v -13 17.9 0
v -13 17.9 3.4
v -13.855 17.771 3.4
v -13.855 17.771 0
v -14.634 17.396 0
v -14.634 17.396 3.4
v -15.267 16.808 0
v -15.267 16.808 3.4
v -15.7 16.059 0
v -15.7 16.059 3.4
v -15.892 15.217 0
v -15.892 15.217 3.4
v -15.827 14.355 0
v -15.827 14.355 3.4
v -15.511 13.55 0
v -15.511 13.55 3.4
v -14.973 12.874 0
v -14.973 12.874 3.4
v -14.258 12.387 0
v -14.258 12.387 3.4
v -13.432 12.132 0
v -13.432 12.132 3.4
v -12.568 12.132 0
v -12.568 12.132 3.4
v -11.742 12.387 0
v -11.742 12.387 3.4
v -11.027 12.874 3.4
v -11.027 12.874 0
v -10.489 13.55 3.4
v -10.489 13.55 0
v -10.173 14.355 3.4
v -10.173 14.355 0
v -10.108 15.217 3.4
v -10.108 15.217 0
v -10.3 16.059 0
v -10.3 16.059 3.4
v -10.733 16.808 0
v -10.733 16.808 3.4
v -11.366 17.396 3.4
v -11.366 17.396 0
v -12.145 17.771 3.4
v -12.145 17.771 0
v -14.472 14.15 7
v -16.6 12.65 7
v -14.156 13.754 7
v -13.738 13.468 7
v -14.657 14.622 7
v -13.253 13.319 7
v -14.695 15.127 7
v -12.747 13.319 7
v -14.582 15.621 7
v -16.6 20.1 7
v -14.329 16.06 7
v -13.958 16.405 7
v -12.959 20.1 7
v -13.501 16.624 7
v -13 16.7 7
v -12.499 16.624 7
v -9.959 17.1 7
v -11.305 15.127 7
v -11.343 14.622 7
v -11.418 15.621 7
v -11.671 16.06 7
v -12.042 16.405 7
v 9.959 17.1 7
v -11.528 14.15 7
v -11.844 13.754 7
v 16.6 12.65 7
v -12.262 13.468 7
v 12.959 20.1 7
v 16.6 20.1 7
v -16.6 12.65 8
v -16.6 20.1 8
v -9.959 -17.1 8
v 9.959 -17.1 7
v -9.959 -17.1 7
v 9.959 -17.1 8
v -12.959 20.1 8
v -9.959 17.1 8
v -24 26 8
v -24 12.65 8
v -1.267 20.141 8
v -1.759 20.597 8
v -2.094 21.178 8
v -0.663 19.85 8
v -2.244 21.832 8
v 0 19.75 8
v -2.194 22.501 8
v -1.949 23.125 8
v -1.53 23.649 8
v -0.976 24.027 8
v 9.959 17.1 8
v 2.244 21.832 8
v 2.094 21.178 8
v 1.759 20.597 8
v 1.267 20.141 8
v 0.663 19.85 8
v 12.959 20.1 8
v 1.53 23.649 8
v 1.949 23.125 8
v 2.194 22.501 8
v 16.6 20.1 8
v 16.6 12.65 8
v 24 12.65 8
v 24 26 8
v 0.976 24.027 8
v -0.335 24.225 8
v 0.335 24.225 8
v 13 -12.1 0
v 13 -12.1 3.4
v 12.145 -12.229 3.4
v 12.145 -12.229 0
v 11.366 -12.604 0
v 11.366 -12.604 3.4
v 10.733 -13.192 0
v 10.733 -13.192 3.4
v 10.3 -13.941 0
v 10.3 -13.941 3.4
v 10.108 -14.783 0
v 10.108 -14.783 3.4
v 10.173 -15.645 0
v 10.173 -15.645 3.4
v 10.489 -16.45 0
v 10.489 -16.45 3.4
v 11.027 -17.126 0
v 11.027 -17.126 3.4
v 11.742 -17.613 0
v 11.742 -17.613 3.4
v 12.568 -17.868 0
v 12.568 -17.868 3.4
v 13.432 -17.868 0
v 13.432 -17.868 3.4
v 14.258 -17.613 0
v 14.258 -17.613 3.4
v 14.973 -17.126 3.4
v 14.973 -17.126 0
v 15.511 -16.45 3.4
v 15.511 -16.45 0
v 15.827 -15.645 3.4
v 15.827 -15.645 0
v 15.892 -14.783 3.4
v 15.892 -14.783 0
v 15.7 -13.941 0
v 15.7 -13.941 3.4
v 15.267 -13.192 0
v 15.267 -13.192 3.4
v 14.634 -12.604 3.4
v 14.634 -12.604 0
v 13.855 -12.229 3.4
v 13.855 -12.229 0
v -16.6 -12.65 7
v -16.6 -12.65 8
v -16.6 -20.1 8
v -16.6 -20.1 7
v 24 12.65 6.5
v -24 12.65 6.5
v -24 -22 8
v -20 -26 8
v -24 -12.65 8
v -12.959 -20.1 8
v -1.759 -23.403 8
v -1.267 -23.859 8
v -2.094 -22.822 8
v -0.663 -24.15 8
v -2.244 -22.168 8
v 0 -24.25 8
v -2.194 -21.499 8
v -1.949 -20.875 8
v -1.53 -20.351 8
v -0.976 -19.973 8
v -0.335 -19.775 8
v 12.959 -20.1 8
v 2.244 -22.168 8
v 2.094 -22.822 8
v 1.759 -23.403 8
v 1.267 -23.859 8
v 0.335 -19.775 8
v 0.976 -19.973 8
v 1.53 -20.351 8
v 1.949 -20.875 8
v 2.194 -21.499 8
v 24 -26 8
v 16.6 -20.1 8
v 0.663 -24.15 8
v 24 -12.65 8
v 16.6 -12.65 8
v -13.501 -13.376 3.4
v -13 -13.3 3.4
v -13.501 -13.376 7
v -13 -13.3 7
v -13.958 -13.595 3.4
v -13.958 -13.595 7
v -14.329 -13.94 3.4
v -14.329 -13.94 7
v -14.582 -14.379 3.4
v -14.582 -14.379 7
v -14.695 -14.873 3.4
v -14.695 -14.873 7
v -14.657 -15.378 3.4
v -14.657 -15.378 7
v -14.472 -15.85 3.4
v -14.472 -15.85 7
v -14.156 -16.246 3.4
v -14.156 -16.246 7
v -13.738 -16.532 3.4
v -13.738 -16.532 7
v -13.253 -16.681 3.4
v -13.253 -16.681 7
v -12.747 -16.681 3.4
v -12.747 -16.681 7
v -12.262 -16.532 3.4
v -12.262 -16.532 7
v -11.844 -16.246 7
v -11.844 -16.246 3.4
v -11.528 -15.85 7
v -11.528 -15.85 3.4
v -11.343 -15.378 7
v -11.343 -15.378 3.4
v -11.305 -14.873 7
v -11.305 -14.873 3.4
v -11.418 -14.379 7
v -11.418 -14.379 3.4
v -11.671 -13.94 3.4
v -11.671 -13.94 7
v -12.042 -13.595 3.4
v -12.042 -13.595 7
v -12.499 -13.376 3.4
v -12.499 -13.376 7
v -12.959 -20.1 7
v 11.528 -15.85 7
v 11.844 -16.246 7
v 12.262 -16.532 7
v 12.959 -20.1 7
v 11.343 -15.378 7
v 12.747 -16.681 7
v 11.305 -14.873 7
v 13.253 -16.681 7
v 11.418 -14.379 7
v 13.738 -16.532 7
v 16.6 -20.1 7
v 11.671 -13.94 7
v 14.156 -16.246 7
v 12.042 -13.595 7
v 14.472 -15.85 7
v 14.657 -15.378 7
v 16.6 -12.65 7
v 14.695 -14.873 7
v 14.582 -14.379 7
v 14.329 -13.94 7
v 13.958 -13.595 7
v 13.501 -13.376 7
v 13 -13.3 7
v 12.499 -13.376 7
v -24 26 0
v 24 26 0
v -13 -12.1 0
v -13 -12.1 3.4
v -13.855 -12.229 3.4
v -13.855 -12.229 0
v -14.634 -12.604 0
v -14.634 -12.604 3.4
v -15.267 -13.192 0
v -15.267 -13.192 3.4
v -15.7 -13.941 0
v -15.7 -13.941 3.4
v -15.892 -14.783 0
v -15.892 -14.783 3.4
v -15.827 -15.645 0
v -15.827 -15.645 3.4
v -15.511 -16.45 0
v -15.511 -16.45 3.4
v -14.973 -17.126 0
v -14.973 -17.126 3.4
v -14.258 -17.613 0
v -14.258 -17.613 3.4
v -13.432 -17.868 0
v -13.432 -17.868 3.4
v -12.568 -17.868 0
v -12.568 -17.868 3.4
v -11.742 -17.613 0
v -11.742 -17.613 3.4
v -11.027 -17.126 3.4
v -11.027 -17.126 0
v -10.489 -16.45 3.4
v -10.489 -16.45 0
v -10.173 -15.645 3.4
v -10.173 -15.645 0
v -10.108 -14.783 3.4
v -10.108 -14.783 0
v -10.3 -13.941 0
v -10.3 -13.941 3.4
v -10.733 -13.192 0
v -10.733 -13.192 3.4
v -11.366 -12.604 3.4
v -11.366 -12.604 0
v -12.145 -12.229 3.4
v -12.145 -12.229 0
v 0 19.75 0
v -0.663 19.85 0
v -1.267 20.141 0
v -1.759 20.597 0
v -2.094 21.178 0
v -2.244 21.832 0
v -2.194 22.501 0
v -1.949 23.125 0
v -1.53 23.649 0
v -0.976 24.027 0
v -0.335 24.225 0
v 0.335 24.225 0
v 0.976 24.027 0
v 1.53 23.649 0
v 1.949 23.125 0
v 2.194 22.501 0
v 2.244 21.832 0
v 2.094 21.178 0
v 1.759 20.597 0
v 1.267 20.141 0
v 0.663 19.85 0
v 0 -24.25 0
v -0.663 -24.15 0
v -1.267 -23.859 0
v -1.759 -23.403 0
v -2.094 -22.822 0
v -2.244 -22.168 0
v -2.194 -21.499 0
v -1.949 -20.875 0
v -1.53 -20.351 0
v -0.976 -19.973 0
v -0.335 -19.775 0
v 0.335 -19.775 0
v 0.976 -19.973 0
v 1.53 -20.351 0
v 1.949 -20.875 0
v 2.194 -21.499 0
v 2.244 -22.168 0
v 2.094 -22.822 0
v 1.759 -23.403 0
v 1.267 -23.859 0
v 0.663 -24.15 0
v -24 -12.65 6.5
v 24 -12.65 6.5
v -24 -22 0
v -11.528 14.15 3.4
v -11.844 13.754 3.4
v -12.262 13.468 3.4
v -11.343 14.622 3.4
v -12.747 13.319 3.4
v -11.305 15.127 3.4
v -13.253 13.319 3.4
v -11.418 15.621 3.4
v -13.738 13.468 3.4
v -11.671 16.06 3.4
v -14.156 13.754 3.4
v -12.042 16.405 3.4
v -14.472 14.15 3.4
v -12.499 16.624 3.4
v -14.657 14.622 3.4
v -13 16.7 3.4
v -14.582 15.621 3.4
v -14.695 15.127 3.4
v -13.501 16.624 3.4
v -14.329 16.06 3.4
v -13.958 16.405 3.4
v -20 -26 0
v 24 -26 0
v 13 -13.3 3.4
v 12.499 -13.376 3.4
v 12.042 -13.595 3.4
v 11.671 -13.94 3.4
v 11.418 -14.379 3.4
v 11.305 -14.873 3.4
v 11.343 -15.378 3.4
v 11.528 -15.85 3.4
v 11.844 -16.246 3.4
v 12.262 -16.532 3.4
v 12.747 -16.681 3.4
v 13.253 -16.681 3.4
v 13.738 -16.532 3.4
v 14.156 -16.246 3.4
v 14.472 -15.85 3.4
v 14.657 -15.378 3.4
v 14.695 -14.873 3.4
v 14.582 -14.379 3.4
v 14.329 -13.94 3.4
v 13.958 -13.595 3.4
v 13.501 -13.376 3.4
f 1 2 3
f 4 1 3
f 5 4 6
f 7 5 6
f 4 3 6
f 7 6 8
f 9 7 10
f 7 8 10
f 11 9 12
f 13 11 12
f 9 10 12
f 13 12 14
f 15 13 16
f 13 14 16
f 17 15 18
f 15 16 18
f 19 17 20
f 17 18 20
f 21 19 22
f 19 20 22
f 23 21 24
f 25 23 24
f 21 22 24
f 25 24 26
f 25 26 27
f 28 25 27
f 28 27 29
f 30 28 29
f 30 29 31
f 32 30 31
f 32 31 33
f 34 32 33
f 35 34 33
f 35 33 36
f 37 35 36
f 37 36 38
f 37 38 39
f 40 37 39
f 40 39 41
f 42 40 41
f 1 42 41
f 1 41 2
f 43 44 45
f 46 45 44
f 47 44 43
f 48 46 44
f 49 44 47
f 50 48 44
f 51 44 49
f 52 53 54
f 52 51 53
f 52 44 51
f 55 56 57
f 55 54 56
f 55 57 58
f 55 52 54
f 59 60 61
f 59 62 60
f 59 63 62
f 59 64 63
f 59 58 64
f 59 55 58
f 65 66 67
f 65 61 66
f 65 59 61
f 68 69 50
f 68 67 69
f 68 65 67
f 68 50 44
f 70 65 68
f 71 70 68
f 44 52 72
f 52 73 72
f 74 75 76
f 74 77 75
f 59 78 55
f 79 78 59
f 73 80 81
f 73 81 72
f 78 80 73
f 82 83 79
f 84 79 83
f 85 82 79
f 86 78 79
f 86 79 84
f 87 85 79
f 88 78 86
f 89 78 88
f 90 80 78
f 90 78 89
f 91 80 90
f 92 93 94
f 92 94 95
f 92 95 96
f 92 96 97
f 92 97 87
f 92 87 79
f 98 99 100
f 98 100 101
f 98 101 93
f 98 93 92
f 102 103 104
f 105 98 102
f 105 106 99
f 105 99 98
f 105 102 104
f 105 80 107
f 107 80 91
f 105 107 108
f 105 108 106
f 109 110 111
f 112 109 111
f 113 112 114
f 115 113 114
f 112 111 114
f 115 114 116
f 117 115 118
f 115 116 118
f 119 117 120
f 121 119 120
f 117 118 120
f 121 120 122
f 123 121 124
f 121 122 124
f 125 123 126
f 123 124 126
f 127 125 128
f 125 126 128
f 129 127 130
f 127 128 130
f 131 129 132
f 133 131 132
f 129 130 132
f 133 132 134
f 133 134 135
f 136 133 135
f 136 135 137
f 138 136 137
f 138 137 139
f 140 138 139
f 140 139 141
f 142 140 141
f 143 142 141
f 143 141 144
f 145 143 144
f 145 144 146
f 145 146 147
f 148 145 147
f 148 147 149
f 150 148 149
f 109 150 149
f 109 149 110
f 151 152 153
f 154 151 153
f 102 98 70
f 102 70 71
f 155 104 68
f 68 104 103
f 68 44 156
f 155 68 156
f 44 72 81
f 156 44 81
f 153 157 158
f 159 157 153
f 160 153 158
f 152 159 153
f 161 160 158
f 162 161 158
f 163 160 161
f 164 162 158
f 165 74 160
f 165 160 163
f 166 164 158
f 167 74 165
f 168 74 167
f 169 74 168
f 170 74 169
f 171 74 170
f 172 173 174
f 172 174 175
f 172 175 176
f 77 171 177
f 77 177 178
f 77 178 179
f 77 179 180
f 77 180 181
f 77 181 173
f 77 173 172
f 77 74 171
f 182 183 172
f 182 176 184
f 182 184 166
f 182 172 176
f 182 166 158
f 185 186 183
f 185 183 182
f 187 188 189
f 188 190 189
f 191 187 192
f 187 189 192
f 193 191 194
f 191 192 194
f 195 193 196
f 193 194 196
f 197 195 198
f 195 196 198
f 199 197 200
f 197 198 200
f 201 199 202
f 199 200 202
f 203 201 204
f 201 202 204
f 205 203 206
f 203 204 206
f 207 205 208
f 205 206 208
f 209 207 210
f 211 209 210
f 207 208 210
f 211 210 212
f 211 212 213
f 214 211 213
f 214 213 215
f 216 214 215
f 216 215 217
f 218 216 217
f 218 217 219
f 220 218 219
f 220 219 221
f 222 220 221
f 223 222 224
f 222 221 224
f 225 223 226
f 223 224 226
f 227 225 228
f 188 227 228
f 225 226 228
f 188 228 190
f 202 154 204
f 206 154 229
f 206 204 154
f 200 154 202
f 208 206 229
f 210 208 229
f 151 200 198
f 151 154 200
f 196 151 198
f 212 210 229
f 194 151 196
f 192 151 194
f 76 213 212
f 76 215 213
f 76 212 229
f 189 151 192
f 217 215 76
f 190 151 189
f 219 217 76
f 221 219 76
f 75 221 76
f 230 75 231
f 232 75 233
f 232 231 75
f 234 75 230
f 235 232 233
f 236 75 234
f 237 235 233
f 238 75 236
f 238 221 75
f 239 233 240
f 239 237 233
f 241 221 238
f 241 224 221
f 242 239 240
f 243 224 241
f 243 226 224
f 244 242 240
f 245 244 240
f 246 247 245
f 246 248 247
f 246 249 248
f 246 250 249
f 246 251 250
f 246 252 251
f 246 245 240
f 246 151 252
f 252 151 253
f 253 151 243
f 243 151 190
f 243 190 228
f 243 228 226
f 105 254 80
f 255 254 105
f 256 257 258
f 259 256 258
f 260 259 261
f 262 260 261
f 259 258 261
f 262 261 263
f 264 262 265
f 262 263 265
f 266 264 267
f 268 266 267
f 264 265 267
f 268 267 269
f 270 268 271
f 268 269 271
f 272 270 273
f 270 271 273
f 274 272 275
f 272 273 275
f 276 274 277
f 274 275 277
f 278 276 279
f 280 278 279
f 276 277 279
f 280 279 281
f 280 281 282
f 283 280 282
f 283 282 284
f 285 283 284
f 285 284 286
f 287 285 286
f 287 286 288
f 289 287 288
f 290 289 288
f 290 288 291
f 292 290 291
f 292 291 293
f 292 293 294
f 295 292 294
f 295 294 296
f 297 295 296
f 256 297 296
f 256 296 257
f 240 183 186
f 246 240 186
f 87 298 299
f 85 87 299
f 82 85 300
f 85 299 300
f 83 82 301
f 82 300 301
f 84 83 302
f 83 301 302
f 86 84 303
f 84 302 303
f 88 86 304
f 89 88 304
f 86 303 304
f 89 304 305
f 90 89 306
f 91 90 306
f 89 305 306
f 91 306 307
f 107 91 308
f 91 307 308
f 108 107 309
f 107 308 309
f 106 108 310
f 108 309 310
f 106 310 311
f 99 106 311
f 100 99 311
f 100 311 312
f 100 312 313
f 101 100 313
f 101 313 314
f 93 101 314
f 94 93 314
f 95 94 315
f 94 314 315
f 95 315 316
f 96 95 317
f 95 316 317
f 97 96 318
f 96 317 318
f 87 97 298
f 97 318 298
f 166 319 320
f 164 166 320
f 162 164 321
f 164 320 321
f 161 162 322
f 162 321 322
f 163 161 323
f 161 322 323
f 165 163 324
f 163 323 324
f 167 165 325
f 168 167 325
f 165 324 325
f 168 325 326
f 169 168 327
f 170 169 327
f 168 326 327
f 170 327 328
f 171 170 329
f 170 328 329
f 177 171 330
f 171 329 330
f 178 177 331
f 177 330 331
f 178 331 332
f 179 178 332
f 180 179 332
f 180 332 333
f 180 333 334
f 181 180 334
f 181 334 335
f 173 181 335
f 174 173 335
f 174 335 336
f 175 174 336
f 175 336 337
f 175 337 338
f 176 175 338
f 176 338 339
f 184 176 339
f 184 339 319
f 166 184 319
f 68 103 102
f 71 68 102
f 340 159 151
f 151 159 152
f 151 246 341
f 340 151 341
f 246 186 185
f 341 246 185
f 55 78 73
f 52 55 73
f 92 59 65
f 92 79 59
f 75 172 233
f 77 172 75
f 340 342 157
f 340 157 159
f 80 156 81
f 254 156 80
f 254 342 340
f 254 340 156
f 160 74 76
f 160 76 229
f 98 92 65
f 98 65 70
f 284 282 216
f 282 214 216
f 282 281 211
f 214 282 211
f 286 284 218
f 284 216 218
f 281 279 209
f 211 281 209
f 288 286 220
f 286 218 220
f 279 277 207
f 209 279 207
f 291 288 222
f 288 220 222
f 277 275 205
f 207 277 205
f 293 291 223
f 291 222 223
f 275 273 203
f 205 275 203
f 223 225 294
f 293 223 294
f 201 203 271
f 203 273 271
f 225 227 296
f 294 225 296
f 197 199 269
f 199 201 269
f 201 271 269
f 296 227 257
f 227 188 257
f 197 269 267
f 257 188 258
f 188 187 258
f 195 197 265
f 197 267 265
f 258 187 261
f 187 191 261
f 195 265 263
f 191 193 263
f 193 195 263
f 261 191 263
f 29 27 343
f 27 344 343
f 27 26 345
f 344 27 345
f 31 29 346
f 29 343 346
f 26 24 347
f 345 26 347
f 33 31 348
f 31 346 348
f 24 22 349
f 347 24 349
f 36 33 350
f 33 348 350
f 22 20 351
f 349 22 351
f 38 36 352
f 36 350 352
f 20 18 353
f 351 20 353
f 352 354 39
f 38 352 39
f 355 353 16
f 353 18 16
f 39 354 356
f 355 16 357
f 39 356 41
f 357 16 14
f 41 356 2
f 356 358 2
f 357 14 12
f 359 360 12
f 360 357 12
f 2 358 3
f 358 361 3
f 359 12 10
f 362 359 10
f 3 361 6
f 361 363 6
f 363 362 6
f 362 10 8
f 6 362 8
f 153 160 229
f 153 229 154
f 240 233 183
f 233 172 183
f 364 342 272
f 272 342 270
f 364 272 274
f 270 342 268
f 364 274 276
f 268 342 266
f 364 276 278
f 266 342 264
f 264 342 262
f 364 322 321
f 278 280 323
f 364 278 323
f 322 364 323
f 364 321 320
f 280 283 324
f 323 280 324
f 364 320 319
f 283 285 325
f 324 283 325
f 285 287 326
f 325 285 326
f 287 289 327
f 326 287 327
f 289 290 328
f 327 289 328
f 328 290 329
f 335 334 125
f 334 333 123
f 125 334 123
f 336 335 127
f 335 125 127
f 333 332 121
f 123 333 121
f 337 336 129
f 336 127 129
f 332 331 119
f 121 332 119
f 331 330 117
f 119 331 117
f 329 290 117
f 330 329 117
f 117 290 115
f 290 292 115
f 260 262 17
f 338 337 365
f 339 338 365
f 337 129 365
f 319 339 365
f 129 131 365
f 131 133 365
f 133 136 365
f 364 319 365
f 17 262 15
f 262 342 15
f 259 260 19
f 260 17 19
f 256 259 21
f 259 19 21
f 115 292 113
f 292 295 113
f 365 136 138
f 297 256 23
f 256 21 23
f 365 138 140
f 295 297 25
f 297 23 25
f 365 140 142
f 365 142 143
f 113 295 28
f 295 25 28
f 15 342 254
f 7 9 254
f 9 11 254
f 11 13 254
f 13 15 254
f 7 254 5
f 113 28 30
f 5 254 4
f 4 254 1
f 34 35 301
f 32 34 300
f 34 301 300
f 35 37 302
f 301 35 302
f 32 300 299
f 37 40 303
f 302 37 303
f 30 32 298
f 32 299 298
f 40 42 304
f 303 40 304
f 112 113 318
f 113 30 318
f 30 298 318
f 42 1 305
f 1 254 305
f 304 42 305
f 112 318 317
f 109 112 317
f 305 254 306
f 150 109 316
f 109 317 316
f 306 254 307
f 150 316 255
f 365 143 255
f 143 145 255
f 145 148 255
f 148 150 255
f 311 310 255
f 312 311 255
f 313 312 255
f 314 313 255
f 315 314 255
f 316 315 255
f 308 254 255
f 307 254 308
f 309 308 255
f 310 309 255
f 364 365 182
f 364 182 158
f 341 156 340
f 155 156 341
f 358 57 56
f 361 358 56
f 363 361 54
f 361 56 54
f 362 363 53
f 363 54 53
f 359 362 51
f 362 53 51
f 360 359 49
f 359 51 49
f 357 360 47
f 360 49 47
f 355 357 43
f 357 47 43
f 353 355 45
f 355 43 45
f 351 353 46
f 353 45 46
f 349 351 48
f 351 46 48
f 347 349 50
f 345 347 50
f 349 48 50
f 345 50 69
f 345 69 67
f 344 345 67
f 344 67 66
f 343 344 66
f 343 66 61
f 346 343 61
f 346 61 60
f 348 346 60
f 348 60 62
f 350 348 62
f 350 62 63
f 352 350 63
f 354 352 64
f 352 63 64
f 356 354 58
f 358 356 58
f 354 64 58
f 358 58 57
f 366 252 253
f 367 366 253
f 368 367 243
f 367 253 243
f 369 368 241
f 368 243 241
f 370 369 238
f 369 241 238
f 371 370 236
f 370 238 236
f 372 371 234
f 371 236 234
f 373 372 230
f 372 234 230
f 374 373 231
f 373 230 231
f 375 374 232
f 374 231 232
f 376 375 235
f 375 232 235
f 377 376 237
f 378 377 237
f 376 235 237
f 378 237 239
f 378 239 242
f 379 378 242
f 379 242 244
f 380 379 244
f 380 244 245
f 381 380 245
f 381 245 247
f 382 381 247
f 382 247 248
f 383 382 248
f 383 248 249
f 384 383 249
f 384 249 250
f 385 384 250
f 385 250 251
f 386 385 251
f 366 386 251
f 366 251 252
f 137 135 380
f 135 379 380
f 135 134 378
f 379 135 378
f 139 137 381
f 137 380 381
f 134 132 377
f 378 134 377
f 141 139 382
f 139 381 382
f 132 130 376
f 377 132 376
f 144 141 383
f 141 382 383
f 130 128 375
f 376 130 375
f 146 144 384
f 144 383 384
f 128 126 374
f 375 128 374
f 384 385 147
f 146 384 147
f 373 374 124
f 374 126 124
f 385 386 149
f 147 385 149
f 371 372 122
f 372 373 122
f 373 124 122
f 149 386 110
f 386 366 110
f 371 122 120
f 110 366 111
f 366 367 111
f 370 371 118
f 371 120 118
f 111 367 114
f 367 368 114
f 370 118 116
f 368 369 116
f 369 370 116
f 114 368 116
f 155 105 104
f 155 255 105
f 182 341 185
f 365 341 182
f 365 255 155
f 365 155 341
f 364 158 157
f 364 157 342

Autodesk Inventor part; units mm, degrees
ref_plane "YZ Plane" through (0, 0, 0) normal (1, 0, 0) x (0, 1, 0)
ref_plane "XZ Plane" through (0, 0, 0) normal (0, 1, 0) x (-1, 0, 0)
ref_plane "XY Plane" through (0, 0, 0) normal (0, 0, 1) x (1, 0, 0)
sketch "Sketch1" plane through (0, 0, 0) normal (0, 0, 1) x (1, 0, 0)
  line L0 (-24, 26) -> (24, 26)
  line L1 (24, 26) -> (24, -26)
  line L2 (24, -26) -> (-24, -26)
  line L3 (-24, -26) -> (-24, 26)
  line L4 (-24, 26) -> (24, -26) construction
  line L5 (24, 26) -> (-24, -26) construction
  point P0 (0, 0)
  dimension "d2" = 48
  dimension "d3" = 52
extrude "Extrusion1" add sketch "Sketch1" along normal blind 8
sketch "Sketch2" plane through (0, 0, 8) normal (0, 0, 1) x (1, 0, 0)
  line L0 (0, 22) -> (0, -22) construction
  point P0 (0, 0)
  point P1 (0, 0)
  dimension "d4" = 44
hole "Hole1" at (0, 22, 8) at (0, -22, 8) direction (0, 0, -1) diameter 4.5 depth 20 clearance for "Hex Head Cap Screw ISO 24017" size "M4" standard "ISO"
sketch "Sketch3" plane through (0, 0, 8) normal (0, 0, 1) x (1, 0, 0)
  line L0 (13, -20) -> (16.5, -20) projected
  line L1 (10, -17) -> (-10, -17) projected
  line L2 (13, 20) -> (16.5, 20) projected
  line L3 (-10, 17) -> (10, 17) projected
  line L4 (-13, 20) -> (-16.5, 20) projected
  line L5 (-13, 20) -> (-10, 17) projected
  line L6 (10, 17) -> (13, 20) projected
  line L7 (13, -20) -> (10, -17) projected
  line L8 (-10, -17) -> (-13, -20) projected
  line L9 (-13, -20) -> (-16.5, -20) projected
  circle A0 centre (0, 22) radius 2.25 construction
  circle A1 centre (0, -22) radius 2.25 construction
  line L10 (-24, -26) -> (24, -26) construction
  line L11 (24, -26) -> (24, 26) construction
  line L12 (24, 26) -> (-24, 26) construction
  line L13 (-24, 26) -> (-24, -26) construction
  line L14 (16.5, -20) -> (16.5, 20)
  line L15 (-16.5, 20) -> (-16.5, -20)
  point P0 (0, 0)
extrude "Extrusion2" cut sketch "Sketch3" against normal blind 0.9
sketch "Sketch4" plane through (0, 0, 0) normal (0, 0, -1) x (-1, 0, 0)
  line L0 (-13, -15) -> (13, -15) construction
  line L1 (13, -15) -> (13, 15) construction
  line L2 (13, 15) -> (-13, 15) construction
  line L3 (-13, 15) -> (-13, -15) construction
  line L4 (-13, -15) -> (13, 15) construction
  line L5 (13, -15) -> (-13, 15) construction
  point P0 (0, 0)
  dimension "d16" = 26
  dimension "d17" = 30
hole "Hole2" at (-13, 15, 0) at (-13, -15, 0) at (13, -15, 0) direction (0, 0, 1) diameter 3.4 end through all counterbore diameter 5.8 counterbore depth 3.4 clearance for "Socket Head Cap Screw ISO 4762" size "M3" standard "ISO"
chamfer "Chamfer1" distance 4 angle 45 1 edges at (-24, -26, 4)
thicken "Thicken1" operation cut thickness 0.1 both sides no extend neighbours no toward (0, 1, 0) faces at (-14.1667, 20, 7.7) (-11, 18, 7.7) (3.3333, 17, 7.4) (12, 19, 7.7) (15.3333, 20, 7.7) (11, -18, 7.7) (14.1667, -20, 7.7) (-3.3333, -17, 7.7) (-15.3333, -20, 7.7) (-12, -19, 7.7) (3.3333, 5.6667, 7.1) (16.5, -6.6667, 7.7) (-16.5, 6.6667, 7.7)
sketch "Sketch5" plane through (0, 0, 8) normal (0, 0, 1) x (1, 0, 0)
  line L0 (24, 12.65) -> (-24, 12.65)
  line L1 (-24, 12.65) -> (-24, -12.65)
  line L2 (-24, -12.65) -> (24, -12.65)
  line L3 (24, -12.65) -> (24, 12.65)
  line L4 (24, 12.65) -> (-24, -12.65) construction
  line L5 (-24, 12.65) -> (24, -12.65) construction
  line L6 (24, -26) -> (24, 26) construction
  point P0 (0, 0)
  dimension "d28" = 25.3
extrude "Extrusion3" cut sketch "Sketch5" against normal blind 1.5
properties part number "ChamberMount_c"
